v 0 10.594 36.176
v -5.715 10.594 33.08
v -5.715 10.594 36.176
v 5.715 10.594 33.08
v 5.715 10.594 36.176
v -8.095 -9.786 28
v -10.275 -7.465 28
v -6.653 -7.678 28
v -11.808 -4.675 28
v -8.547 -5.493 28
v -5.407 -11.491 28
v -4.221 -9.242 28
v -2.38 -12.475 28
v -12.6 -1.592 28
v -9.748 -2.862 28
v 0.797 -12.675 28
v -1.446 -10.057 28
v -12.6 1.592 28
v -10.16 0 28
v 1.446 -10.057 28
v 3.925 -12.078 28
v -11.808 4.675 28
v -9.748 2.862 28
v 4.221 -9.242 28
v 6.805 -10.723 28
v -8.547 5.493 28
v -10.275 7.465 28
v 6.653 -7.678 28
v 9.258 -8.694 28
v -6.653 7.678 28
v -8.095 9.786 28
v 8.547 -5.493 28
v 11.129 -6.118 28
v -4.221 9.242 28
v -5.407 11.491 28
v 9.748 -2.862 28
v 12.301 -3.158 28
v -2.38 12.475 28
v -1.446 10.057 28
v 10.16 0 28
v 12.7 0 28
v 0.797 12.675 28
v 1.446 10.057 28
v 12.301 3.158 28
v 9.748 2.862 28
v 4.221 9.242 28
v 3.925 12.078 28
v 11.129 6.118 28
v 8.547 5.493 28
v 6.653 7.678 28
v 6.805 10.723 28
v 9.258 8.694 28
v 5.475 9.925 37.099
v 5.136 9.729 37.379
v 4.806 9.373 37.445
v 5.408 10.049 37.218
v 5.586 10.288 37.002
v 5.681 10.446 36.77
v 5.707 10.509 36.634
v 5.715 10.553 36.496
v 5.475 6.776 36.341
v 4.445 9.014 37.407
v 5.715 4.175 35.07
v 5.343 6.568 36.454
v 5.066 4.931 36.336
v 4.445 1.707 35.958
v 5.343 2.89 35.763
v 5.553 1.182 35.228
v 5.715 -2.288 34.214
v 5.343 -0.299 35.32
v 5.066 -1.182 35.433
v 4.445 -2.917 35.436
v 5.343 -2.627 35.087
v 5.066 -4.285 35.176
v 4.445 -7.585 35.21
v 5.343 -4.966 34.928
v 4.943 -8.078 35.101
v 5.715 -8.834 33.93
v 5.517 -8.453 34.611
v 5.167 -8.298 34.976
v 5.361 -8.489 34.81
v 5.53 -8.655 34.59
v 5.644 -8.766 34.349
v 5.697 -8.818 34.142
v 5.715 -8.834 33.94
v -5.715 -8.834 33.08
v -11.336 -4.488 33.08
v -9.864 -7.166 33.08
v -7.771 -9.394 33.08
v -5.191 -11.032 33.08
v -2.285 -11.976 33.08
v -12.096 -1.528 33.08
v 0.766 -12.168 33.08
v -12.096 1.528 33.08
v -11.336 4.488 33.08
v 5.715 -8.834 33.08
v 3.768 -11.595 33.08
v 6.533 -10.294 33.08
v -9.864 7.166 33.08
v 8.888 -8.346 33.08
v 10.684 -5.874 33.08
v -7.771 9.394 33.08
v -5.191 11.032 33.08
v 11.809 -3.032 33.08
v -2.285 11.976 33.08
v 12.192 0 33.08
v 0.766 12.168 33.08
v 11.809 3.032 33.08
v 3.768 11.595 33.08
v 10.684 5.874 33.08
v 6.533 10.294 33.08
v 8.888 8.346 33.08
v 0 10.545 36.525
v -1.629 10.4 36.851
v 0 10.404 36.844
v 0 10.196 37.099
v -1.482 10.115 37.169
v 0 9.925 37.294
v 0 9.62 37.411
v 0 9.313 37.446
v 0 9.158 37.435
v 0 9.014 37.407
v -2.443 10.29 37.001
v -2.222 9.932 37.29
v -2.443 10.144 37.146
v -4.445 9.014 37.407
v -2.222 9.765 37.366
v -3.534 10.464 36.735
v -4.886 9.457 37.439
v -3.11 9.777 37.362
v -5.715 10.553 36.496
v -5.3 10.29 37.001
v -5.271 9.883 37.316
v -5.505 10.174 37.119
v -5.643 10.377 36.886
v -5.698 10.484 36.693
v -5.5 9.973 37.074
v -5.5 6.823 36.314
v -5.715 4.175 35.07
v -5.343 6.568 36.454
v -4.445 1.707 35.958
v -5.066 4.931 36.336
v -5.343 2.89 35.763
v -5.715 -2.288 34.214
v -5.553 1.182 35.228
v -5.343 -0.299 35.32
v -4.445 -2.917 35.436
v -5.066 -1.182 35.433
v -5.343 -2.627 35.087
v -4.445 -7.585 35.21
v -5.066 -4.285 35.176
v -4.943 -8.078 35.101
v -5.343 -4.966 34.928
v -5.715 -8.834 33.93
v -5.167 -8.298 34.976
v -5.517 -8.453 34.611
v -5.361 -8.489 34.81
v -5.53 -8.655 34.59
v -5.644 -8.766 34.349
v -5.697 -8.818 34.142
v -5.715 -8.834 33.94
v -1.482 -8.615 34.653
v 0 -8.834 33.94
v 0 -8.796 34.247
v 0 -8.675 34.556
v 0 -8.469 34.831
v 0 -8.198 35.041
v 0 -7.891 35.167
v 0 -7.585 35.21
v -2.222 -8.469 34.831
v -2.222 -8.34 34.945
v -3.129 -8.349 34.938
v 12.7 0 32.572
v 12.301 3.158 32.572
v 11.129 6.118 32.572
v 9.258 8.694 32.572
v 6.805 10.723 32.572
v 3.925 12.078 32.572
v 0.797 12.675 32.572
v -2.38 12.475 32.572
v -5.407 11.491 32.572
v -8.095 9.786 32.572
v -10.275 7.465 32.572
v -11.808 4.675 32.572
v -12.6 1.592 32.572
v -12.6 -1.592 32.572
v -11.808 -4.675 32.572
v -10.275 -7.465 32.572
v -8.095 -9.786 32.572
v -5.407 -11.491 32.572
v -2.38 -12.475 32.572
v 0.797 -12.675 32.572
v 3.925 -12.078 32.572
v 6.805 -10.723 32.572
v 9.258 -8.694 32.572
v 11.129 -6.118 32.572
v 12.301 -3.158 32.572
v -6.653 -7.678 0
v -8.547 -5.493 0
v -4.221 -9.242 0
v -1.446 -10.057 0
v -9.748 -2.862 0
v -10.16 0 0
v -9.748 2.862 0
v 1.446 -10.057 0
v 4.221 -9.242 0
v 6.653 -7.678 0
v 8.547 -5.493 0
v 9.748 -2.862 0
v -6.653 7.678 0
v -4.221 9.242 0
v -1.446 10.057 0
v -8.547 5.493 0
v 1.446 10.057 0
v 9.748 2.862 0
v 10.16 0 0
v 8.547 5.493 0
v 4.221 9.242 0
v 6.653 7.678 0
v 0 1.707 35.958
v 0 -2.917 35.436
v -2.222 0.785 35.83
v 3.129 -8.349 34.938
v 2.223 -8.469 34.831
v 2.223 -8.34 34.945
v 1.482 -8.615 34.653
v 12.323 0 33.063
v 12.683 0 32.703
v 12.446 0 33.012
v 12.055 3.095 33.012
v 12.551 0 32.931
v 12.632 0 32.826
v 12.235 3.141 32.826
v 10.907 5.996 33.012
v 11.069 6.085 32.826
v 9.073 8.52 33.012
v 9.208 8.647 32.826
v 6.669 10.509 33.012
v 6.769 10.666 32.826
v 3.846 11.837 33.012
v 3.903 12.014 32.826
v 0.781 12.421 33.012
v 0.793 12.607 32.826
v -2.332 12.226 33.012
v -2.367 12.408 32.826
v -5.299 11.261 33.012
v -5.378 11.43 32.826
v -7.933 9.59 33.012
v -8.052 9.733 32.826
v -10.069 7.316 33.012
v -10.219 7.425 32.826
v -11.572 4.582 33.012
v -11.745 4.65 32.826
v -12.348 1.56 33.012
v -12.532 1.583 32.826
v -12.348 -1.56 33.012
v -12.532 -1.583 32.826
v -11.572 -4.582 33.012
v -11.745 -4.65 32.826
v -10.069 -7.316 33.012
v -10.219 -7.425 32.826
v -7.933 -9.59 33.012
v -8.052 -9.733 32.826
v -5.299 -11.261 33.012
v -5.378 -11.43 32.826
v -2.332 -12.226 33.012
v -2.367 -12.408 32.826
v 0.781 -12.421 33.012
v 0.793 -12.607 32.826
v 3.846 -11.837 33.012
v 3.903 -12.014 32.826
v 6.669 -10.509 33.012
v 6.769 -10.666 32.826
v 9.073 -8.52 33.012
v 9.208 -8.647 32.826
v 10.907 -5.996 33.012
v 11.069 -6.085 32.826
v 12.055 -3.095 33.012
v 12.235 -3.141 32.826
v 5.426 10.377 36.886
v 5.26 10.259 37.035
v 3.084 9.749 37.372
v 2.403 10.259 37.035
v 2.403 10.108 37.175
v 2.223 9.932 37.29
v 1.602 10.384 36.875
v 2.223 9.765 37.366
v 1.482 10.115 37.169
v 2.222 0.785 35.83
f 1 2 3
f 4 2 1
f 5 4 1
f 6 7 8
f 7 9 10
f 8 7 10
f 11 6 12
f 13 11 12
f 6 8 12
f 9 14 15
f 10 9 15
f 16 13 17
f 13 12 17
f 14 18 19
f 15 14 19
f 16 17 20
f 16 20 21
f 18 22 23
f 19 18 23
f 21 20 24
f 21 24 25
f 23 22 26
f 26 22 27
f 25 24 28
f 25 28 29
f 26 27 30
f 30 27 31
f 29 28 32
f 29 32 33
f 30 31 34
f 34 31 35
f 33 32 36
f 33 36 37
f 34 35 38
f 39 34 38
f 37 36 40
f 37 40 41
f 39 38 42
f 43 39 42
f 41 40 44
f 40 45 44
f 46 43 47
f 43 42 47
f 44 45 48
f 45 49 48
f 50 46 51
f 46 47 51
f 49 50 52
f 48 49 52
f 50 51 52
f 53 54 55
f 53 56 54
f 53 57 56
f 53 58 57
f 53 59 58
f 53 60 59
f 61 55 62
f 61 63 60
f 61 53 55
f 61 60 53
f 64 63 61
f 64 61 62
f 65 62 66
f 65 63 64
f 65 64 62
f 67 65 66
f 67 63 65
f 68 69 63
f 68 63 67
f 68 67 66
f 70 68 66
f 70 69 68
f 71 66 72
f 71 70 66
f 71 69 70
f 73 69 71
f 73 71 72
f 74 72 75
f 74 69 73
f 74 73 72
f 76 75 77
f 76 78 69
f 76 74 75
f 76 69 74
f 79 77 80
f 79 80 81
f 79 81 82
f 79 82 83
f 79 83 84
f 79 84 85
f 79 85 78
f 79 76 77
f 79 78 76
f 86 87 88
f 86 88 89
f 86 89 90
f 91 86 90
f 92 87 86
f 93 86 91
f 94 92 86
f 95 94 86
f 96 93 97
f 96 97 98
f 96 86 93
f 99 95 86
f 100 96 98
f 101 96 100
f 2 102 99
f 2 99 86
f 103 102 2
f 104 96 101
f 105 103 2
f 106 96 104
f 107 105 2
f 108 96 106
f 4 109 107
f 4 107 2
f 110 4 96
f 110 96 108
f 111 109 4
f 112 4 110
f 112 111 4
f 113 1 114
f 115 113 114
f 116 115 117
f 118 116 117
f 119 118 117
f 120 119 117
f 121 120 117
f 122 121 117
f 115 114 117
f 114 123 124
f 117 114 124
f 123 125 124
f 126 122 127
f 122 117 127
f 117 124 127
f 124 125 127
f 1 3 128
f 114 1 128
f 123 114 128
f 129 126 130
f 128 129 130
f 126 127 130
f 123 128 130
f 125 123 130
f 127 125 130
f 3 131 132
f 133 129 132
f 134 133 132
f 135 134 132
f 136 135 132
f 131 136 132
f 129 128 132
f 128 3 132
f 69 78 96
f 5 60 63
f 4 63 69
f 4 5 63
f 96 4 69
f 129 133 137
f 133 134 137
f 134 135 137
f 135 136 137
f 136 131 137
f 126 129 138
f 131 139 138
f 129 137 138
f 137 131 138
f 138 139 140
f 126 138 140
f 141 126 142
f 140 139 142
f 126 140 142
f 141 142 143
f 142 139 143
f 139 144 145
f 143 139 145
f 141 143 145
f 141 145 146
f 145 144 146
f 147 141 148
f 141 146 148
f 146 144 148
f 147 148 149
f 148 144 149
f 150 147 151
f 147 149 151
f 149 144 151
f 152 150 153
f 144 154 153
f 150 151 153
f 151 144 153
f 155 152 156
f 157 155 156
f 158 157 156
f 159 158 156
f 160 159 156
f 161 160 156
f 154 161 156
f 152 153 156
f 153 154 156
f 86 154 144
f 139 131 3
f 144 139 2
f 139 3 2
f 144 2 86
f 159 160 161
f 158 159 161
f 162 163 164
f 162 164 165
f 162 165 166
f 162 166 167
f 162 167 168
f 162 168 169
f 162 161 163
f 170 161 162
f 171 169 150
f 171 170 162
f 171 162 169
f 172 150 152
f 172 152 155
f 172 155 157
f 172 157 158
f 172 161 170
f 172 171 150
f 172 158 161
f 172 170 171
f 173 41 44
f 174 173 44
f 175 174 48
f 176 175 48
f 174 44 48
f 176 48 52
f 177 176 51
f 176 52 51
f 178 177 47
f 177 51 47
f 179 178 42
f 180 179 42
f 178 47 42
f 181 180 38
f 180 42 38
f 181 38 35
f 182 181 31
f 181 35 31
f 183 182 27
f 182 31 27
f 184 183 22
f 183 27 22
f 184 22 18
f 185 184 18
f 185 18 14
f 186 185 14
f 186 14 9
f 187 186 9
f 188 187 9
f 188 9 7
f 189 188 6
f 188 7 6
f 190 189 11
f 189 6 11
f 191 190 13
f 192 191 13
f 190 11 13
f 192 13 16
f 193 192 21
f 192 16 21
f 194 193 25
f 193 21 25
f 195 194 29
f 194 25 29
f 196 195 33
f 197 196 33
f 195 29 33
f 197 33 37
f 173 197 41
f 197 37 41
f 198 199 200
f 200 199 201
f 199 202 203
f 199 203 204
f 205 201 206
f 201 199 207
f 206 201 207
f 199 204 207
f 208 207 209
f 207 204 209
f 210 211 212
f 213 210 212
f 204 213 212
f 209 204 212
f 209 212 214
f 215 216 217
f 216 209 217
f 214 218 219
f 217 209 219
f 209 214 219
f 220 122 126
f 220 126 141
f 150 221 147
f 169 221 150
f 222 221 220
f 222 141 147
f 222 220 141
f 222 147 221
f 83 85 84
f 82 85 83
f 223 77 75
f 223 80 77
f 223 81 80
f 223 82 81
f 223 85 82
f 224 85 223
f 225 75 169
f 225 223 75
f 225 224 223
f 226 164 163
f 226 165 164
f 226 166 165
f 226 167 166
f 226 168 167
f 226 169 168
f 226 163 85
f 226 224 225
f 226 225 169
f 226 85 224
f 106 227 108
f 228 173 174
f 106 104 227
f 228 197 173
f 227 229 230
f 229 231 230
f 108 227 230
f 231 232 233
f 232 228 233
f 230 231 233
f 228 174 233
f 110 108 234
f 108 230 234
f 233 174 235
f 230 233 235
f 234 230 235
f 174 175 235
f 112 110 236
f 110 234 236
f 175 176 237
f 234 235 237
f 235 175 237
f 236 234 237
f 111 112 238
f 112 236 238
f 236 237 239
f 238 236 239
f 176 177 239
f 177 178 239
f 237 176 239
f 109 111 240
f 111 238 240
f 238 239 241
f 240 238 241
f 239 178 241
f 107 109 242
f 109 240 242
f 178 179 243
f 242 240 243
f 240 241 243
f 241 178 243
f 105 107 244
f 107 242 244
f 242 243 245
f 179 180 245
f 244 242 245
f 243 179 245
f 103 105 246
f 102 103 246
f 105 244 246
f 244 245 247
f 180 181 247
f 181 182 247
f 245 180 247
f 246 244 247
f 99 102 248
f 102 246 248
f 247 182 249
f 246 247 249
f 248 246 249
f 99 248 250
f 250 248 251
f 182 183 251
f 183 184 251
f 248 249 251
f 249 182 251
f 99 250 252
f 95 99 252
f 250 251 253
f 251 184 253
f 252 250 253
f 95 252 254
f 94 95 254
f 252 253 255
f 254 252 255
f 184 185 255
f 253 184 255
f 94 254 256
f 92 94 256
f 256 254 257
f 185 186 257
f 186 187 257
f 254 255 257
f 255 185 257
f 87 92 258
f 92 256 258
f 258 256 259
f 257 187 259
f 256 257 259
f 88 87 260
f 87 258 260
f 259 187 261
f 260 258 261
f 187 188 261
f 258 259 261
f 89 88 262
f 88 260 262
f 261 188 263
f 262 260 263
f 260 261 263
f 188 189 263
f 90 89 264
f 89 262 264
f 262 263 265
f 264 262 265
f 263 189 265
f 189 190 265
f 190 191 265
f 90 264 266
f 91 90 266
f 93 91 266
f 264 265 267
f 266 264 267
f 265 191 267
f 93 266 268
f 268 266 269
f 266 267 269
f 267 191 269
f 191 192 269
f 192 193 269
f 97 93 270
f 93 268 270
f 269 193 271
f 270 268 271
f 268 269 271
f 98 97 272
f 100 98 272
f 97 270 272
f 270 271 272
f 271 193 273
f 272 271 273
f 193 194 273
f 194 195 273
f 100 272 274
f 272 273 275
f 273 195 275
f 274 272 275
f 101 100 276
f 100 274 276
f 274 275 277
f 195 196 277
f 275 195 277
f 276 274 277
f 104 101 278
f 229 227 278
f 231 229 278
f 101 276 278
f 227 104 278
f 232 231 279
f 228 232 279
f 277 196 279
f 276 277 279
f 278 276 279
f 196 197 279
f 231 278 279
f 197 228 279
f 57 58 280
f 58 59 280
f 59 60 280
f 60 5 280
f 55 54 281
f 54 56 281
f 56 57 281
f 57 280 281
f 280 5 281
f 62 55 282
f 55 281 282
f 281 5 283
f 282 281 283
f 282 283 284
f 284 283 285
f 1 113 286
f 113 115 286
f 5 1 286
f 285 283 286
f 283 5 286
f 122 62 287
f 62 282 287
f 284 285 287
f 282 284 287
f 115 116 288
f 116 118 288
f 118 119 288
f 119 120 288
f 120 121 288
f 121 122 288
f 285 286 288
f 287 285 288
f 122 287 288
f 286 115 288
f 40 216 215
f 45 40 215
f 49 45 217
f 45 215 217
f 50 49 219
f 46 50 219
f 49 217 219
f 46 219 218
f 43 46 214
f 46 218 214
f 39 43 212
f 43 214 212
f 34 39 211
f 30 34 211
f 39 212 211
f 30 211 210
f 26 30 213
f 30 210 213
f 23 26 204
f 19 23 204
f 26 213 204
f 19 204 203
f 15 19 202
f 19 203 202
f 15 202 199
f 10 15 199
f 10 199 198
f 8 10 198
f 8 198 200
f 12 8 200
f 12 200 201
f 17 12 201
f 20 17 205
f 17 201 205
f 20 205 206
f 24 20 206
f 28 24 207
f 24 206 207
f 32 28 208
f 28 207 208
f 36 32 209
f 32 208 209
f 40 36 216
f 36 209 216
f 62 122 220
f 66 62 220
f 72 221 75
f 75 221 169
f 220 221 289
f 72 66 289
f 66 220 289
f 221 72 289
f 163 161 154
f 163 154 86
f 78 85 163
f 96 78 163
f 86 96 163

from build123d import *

# Parameters (mm, degrees)
SKETCH1_R           = 10.16
BOSS_EXTRUDE1_DEPTH = 28
SKETCH2_R           = 12.7
BOSS_EXTRUDE2_DEPTH = 5.08
BOSS_EXTRUDE3_DEPTH = 5.715
FILLET1_R           = 1.27
FILLET2_R           = 0.508


with BuildPart() as part:
    # Sketch1 → Boss-Extrude1 (new body)
    with BuildSketch(Plane.XY):
        Circle(SKETCH1_R)
    extrude(amount=BOSS_EXTRUDE1_DEPTH)

    # Sketch2 → Boss-Extrude2 (add)
    with BuildSketch(Plane.XY.offset(28)):
        Circle(SKETCH2_R)
    extrude(amount=BOSS_EXTRUDE2_DEPTH)

    # Sketch3 → Boss-Extrude3 (add, symmetric)
    with BuildSketch(Plane(origin=(0, 0, 0), x_dir=(0, 0, -1), z_dir=(1, 0, 0))):
        with BuildLine():
            Line((-33.08, -8.833721506), (-33.08, 10.59406456))
            Line((-33.08, 10.59406456), (-37.824147833, 10.59406456))
            add(Edge.make_bspline(
                [(-37.824147833, 10.59406456), (-35.198663917, 1.074784021), (-35.199636371, -8.833721506)],
                knots=[0, 0, 0, 1, 1, 1], degree=2))
            Line((-35.199636371, -8.833721506), (-33.08, -8.833721506))
        make_face()
    extrude(amount=BOSS_EXTRUDE3_DEPTH, both=True)

    # Fillet1
    fillet1_edges = [part.edges().sort_by_distance(p)[0] for p in [
        (-2.8575, -8.833721506, 35.199636371),
        (-5.715, 0.969066451, 35.854142221),
        (-2.8575, 10.59406456, 37.824147833),
        (5.715, 0.969066451, 35.854142221),
    ]]
    fillet(fillet1_edges, radius=FILLET1_R)

    # Fillet2
    fillet2_edges = [part.edges().sort_by_distance(p)[0] for p in [
        (-12.7, 0, 33.08),
    ]]
    fillet(fillet2_edges, radius=FILLET2_R)


solid = part.part
